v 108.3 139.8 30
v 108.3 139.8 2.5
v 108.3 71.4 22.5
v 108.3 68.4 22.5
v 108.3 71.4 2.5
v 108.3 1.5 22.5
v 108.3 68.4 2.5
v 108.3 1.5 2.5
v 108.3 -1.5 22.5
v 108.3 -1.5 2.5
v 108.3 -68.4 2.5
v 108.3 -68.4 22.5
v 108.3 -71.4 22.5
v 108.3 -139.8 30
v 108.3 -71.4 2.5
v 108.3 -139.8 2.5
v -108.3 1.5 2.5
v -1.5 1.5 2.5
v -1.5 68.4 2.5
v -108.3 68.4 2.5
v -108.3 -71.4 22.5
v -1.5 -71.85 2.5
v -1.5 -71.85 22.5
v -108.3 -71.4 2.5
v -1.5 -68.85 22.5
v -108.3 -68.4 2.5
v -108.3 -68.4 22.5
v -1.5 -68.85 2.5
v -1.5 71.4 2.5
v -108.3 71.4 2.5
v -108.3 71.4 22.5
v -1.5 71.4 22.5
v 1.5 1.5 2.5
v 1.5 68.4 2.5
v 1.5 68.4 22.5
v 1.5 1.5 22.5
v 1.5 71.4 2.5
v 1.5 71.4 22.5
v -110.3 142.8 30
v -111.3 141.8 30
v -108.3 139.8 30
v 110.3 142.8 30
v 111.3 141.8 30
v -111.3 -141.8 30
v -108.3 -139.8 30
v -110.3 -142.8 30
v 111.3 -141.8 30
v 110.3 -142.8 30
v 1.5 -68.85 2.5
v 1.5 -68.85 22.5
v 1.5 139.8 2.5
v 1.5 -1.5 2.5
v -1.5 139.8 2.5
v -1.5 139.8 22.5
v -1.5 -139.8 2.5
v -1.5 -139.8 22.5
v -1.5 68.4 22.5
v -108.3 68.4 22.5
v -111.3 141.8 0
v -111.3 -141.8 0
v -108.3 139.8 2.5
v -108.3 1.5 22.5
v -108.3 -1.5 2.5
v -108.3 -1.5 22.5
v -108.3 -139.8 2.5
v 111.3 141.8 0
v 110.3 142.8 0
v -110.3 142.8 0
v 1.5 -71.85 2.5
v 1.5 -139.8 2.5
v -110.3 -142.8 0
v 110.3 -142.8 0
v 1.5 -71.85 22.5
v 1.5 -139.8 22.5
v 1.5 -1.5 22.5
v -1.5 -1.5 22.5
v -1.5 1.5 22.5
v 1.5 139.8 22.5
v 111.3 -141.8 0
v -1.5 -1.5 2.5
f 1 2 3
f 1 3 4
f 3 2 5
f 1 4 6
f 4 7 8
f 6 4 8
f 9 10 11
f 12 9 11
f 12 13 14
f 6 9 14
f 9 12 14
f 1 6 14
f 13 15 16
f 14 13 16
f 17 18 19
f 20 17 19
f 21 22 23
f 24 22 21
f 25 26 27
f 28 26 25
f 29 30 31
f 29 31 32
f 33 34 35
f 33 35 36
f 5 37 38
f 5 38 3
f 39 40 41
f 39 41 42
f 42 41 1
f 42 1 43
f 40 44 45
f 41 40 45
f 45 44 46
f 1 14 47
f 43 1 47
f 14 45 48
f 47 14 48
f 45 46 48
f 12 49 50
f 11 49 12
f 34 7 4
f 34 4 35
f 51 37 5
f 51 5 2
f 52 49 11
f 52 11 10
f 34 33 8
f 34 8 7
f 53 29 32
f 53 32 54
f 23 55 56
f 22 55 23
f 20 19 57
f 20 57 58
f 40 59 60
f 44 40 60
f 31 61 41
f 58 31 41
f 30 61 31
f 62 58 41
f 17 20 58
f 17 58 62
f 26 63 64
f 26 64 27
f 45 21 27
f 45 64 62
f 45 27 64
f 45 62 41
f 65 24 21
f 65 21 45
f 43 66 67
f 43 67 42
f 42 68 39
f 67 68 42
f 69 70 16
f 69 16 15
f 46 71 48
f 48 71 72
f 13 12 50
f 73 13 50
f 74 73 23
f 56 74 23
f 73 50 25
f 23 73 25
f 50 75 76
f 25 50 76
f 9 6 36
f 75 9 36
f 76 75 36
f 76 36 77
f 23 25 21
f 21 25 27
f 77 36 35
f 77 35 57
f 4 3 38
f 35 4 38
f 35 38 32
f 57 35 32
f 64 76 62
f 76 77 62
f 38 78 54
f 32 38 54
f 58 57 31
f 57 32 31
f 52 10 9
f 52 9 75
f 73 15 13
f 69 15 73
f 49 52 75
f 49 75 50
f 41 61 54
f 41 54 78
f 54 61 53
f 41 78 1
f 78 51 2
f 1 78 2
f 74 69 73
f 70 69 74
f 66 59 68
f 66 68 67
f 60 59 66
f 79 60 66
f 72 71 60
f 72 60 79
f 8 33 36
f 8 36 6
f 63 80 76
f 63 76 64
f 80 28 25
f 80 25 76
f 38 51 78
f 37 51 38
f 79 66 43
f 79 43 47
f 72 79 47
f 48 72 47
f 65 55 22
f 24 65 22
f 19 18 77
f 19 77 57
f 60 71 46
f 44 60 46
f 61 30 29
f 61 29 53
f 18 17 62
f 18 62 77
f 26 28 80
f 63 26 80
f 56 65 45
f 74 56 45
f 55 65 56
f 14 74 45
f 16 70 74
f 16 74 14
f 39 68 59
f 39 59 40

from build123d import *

# Parameters (mm, degrees)
SKETCH1_W                     = 279.6
SKETCH1_H                     = 216.6
BOSS_EXTRUDE1_DEPTH           = 2.5
SKETCH2_W                     = 222.6
SKETCH2_H                     = 285.6
SKETCH2_W_2                   = 216.6
SKETCH2_H_2                   = 279.6
BOSS_EXTRUDE2_WALL_30MM_DEPTH = 30
BOSS_EXTRUDE3_DEPTH           = 20
CHAMFER1_SIZE                 = 1


with BuildPart() as part:
    # Sketch1 → Boss-Extrude1 (new body)
    with BuildSketch(Plane(origin=(0, 0, 0), x_dir=(0, 1, 0), z_dir=(0, 0, 1))):
        Rectangle(SKETCH1_W, SKETCH1_H)
    extrude(amount=BOSS_EXTRUDE1_DEPTH)

    # Sketch2 → Boss-Extrude2 wall 30mm (add)
    with BuildSketch(Plane(origin=(0, 0, 0), x_dir=(1, 0, 0), z_dir=(0, 0, -1))):
        Rectangle(SKETCH2_W, SKETCH2_H)
        Rectangle(SKETCH2_W_2, SKETCH2_H_2, mode=Mode.SUBTRACT)
    extrude(amount=-BOSS_EXTRUDE2_WALL_30MM_DEPTH)

    # Sketch3 → Boss-Extrude3 (add)
    with BuildSketch(Plane.XY.offset(2.5)):
        Polygon((1.5, 71.4), (108.3, 71.4), (108.3, 68.4), (1.5, 68.4), (1.5, 1.5), (108.3, 1.5), (108.3, -1.5), (1.5, -1.5), (1.5, -68.85), (108.3, -68.4), (108.3, -71.4), (1.5, -71.85), (1.5, -139.8), (-1.5, -139.8), (-1.5, -71.85), (-108.3, -71.4), (-108.3, -68.4), (-1.5, -68.85), (-1.5, -1.5), (-108.3, -1.5), (-108.3, 1.5), (-1.5, 1.5), (-1.5, 68.4), (-108.3, 68.4), (-108.3, 71.4), (-1.5, 71.4), (-1.5, 139.8), (1.5, 139.8), align=None)
    extrude(amount=BOSS_EXTRUDE3_DEPTH)

    # Chamfer1
    chamfer1_edges = [part.edges().sort_by_distance(p)[0] for p in [
        (-111.3, -142.8, 15),
        (111.3, -142.8, 15),
        (111.3, 142.8, 15),
        (-111.3, 142.8, 15),
    ]]
    chamfer(chamfer1_edges, length=CHAMFER1_SIZE)


solid = part.part
